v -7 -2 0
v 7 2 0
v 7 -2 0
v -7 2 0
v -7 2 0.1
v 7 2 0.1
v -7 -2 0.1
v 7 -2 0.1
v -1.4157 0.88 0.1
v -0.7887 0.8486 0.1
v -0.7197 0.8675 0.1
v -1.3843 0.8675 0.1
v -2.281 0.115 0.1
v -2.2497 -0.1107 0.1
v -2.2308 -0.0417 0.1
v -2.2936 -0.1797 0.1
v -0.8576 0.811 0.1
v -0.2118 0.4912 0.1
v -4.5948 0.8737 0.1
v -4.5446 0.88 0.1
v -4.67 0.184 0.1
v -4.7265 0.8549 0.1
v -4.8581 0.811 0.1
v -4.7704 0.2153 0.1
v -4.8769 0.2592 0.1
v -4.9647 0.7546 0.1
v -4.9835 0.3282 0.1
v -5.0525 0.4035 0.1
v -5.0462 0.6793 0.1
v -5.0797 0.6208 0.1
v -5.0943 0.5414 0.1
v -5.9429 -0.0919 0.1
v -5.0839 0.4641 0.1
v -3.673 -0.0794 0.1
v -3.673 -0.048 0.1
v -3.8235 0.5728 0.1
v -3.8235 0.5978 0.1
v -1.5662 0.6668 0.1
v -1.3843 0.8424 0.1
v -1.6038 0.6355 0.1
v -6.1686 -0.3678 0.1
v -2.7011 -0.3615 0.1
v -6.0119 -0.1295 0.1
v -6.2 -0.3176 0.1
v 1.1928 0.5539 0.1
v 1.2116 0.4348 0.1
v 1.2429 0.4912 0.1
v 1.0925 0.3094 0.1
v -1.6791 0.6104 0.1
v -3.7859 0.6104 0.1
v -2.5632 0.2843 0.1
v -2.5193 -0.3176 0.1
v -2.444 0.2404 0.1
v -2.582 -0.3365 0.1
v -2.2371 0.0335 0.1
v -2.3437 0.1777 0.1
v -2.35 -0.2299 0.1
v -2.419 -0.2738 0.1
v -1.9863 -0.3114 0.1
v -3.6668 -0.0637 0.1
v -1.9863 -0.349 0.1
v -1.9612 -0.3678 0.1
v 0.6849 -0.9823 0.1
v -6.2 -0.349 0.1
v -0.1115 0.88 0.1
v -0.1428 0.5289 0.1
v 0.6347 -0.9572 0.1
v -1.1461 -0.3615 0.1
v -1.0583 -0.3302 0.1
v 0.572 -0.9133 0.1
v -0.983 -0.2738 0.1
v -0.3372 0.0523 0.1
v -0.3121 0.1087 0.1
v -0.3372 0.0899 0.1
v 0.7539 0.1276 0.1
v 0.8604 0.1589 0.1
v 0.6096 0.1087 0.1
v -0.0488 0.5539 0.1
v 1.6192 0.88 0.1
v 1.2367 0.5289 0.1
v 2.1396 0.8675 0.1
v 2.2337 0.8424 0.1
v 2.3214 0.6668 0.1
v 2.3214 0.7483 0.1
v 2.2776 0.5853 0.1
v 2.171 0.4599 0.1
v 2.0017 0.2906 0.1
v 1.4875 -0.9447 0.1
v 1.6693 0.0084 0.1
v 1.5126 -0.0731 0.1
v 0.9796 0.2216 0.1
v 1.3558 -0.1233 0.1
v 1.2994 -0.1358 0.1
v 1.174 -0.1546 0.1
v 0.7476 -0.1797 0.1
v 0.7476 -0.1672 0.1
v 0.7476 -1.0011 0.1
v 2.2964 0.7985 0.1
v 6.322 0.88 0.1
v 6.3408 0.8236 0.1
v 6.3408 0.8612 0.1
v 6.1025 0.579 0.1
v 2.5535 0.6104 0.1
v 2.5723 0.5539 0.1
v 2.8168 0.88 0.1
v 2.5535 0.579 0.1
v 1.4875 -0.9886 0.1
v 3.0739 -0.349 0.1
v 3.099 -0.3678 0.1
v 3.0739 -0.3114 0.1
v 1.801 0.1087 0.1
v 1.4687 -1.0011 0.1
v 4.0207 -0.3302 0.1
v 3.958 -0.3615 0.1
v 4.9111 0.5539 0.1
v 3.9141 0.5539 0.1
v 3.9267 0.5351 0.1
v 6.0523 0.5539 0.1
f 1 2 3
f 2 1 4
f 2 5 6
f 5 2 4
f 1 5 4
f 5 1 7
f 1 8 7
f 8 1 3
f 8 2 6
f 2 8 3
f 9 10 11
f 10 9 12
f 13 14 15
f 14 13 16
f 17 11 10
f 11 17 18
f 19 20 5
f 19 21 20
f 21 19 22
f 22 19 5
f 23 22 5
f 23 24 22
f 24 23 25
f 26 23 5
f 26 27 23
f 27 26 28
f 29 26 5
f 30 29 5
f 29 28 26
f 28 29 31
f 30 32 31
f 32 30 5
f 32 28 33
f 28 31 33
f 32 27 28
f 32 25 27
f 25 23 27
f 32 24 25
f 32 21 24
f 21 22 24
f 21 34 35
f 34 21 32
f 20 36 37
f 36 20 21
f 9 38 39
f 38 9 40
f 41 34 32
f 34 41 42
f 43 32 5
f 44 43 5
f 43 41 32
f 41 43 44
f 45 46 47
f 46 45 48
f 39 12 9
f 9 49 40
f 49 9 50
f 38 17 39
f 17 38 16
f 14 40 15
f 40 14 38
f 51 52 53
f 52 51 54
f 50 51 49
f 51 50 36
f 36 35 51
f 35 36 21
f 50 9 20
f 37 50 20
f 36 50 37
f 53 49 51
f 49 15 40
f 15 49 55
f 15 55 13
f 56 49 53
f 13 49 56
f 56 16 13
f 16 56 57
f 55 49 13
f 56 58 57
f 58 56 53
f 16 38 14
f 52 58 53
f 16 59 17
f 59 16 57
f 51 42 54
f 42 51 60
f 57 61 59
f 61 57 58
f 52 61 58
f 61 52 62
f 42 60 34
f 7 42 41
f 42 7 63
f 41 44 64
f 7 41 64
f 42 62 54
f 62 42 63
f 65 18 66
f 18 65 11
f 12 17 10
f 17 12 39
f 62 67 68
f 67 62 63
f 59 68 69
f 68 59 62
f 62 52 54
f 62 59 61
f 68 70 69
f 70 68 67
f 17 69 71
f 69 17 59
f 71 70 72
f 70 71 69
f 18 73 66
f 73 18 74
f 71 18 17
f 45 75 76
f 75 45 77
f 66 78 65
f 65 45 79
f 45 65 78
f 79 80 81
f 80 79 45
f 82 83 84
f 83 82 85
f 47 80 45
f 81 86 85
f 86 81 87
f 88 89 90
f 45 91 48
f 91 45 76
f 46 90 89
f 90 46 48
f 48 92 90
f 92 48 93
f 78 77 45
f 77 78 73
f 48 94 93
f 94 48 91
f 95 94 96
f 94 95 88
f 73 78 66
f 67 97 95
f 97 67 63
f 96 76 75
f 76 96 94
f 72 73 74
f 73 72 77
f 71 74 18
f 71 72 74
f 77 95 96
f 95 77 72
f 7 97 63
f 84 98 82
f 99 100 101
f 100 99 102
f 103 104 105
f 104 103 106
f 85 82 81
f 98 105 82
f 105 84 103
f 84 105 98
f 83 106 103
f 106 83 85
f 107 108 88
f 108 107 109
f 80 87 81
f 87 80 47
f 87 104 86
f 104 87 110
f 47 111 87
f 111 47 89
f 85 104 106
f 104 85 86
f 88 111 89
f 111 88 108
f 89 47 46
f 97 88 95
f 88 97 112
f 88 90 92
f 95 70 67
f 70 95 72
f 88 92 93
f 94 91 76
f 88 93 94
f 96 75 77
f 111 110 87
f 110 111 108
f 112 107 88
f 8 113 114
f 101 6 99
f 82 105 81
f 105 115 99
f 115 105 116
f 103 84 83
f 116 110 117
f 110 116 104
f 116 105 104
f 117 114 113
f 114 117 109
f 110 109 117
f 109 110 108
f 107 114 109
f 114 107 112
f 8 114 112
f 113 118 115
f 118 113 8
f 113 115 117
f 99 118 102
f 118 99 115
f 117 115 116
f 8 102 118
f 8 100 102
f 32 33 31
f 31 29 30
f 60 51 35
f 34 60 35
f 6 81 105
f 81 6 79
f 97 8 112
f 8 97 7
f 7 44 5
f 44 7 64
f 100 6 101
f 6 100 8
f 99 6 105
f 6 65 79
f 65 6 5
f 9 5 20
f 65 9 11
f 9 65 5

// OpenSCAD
// file: ../p/box5-12.scad
use <../lib.scad>
function ldraw_lib__box5_12() = [
// 0 Box with 5 Faces without Any Edges
// 0 Name: box5-12.dat
// 0 Author: Chris Dee [cwdee]
// 0 !LDRAW_ORG Primitive UPDATE 2009-02
// 0 !LICENSE Licensed under CC BY 4.0 : see CAreadme.txt
// 
// 0 BFC CERTIFY CCW
  [0,"BFC","CERTIFY"],
  [0,"BFC","CCW"],
// 
// 0 !HISTORY 2009-09-03 [PTadmin] Official Update 2009-02
// 
// 
// 4 16 1 1 1 1 1 -1 -1 1 -1 -1 1 1
  [4,16,1,1,1,1,1,-1,-1,1,-1,-1,1,1],
// 4 16 -1 0 1 1 0 1 1 1 1 -1 1 1
  [4,16,-1,0,1,1,0,1,1,1,1,-1,1,1],
// 4 16 -1 0 -1 -1 0 1 -1 1 1 -1 1 -1
  [4,16,-1,0,-1,-1,0,1,-1,1,1,-1,1,-1],
// 4 16 1 0 -1 -1 0 -1 -1 1 -1 1 1 -1
  [4,16,1,0,-1,-1,0,-1,-1,1,-1,1,1,-1],
// 4 16 1 0 1 1 0 -1 1 1 -1 1 1 1
  [4,16,1,0,1,1,0,-1,1,1,-1,1,1,1],
// 0
];
module ldraw_lib__box5_12(step=0, col=false, unit=2/5, alt=false, line=0.2, solid=!$preview)
    makepoly(ldraw_lib__box5_12(), step=step, col=col, unit=unit, alt=alt, line=line, solid=solid);
ldraw_lib__box5_12(line=0.2);
// main file
use <../lib.scad>
use <../p/box5-12.scad>
function ldraw_lib__6255869r() = [
// 0 Sticker  0.5 x  1.8 with Silver Dodge "SRT" Logo
// 0 Name: 6255869r.dat
// 0 Author: Magnus Forsberg [MagFors]
// 0 !LDRAW_ORG Part UPDATE 2024-05
// 0 !LICENSE Licensed under CC BY 4.0 : see CAreadme.txt
// 
// 0 BFC CERTIFY CCW
  [0,"BFC","CERTIFY"],
  [0,"BFC","CCW"],
// 
// 0 !KEYWORDS Bricklink 75893stk01, Brickowl 472633, Dodge, Rebrickable 49146
// 0 !KEYWORDS set 75893, Speed Champions
// 
// 0 !HISTORY 2024-06-30 [OrionP] Official Update 2024-05
// 
// 
// 1 16 0 -.25 0 17.5 0 0 0 .25 0 0 0 5 box5-12.dat
  [1,16,0,-.25,0,17.5,0,0,0,.25,0,0,0,5, ldraw_lib__box5_12()],
// 
// 4 0 -3.53925 -.25 2.2 -3.46087 -.25 2.16865 -1.97165 -.25 2.12162 -1.79922 -.25 2.16865
  [4,0,-3.53925,-.25,2.2,-3.46087,-.25,2.16865,-1.97165,-.25,2.12162,-1.79922,-.25,2.16865],
// 4 80 -5.70253 -.25 .28753 -5.73388 -.25 -.44924 -5.62415 -.25 -.2768 -5.57712 -.25 -.10436
  [4,80,-5.70253,-.25,.28753,-5.73388,-.25,-.44924,-5.62415,-.25,-.2768,-5.57712,-.25,-.10436],
// 4 80 -1.97165 -.25 2.12162 -2.14409 -.25 2.02756 -.52947 -.25 1.22809 -1.79922 -.25 2.16865
  [4,80,-1.97165,-.25,2.12162,-2.14409,-.25,2.02756,-.52947,-.25,1.22809,-1.79922,-.25,2.16865],
// 3 0 -11.48696 -.25 2.18432 -11.36155 -.25 2.2 -17.5 -.25 5
  [3,0,-11.48696,-.25,2.18432,-11.36155,-.25,2.2,-17.5,-.25,5],
// 4 80 -11.67507 -.25 .45997 -11.36155 -.25 2.2 -11.48696 -.25 2.18432 -11.81615 -.25 2.1373
  [4,80,-11.67507,-.25,.45997,-11.36155,-.25,2.2,-11.48696,-.25,2.18432,-11.81615,-.25,2.1373],
// 3 0 -11.81615 -.25 2.1373 -11.48696 -.25 2.18432 -17.5 -.25 5
  [3,0,-11.81615,-.25,2.1373,-11.48696,-.25,2.18432,-17.5,-.25,5],
// 3 0 -12.14535 -.25 2.02756 -11.81615 -.25 2.1373 -17.5 -.25 5
  [3,0,-12.14535,-.25,2.02756,-11.81615,-.25,2.1373,-17.5,-.25,5],
// 4 80 -11.92588 -.25 .53835 -11.81615 -.25 2.1373 -12.14535 -.25 2.02756 -12.19237 -.25 .64808
  [4,80,-11.92588,-.25,.53835,-11.81615,-.25,2.1373,-12.14535,-.25,2.02756,-12.19237,-.25,.64808],
// 3 0 -12.41184 -.25 1.88648 -12.14535 -.25 2.02756 -17.5 -.25 5
  [3,0,-12.41184,-.25,1.88648,-12.14535,-.25,2.02756,-17.5,-.25,5],
// 4 80 -12.45887 -.25 .82052 -12.14535 -.25 2.02756 -12.41184 -.25 1.88648 -12.6313 -.25 1.00863
  [4,80,-12.45887,-.25,.82052,-12.14535,-.25,2.02756,-12.41184,-.25,1.88648,-12.6313,-.25,1.00863],
// 3 0 -12.61562 -.25 1.69837 -12.41184 -.25 1.88648 -17.5 -.25 5
  [3,0,-12.61562,-.25,1.69837,-12.41184,-.25,1.88648,-17.5,-.25,5],
// 3 0 -12.69923 -.25 1.55206 -12.61562 -.25 1.69837 -17.5 -.25 5
  [3,0,-12.69923,-.25,1.55206,-12.61562,-.25,1.69837,-17.5,-.25,5],
// 4 80 -12.6313 -.25 1.00863 -12.41184 -.25 1.88648 -12.61562 -.25 1.69837 -12.73581 -.25 1.3535
  [4,80,-12.6313,-.25,1.00863,-12.41184,-.25,1.88648,-12.61562,-.25,1.69837,-12.73581,-.25,1.3535],
// 4 0 -12.73581 -.25 1.3535 -12.69923 -.25 1.55206 -17.5 -.25 5 -14.85729 -.25 -.22977
  [4,0,-12.73581,-.25,1.3535,-12.69923,-.25,1.55206,-17.5,-.25,5,-14.85729,-.25,-.22977],
// 3 0 -14.85729 -.25 -.22977 -12.6313 -.25 1.00863 -12.70968 -.25 1.16016
  [3,0,-14.85729,-.25,-.22977,-12.6313,-.25,1.00863,-12.70968,-.25,1.16016],
// 3 80 -12.6313 -.25 1.00863 -12.73581 -.25 1.3535 -12.70968 -.25 1.16016
  [3,80,-12.6313,-.25,1.00863,-12.73581,-.25,1.3535,-12.70968,-.25,1.16016],
// 3 0 -14.85729 -.25 -.22977 -12.45887 -.25 .82052 -12.6313 -.25 1.00863
  [3,0,-14.85729,-.25,-.22977,-12.45887,-.25,.82052,-12.6313,-.25,1.00863],
// 3 0 -14.85729 -.25 -.22977 -12.19237 -.25 .64808 -12.45887 -.25 .82052
  [3,0,-14.85729,-.25,-.22977,-12.19237,-.25,.64808,-12.45887,-.25,.82052],
// 3 80 -12.19237 -.25 .64808 -12.14535 -.25 2.02756 -12.45887 -.25 .82052
  [3,80,-12.19237,-.25,.64808,-12.14535,-.25,2.02756,-12.45887,-.25,.82052],
// 3 0 -14.85729 -.25 -.22977 -11.92588 -.25 .53835 -12.19237 -.25 .64808
  [3,0,-14.85729,-.25,-.22977,-11.92588,-.25,.53835,-12.19237,-.25,.64808],
// 3 0 -14.85729 -.25 -.22977 -11.67507 -.25 .45997 -11.92588 -.25 .53835
  [3,0,-14.85729,-.25,-.22977,-11.67507,-.25,.45997,-11.92588,-.25,.53835],
// 3 80 -11.67507 -.25 .45997 -11.81615 -.25 2.1373 -11.92588 -.25 .53835
  [3,80,-11.67507,-.25,.45997,-11.81615,-.25,2.1373,-11.92588,-.25,.53835],
// 4 0 -11.67507 -.25 .45997 -14.85729 -.25 -.22977 -9.18259 -.25 -.19842 -9.18259 -.25 -.12004
  [4,0,-11.67507,-.25,.45997,-14.85729,-.25,-.22977,-9.18259,-.25,-.19842,-9.18259,-.25,-.12004],
// 4 80 -9.55881 -.25 1.43188 -9.55881 -.25 1.49458 -11.36155 -.25 2.2 -11.67507 -.25 .45997
  [4,80,-9.55881,-.25,1.43188,-9.55881,-.25,1.49458,-11.36155,-.25,2.2,-11.67507,-.25,.45997],
// 4 80 -3.91547 -.25 1.66702 -3.46087 -.25 2.10594 -3.53925 -.25 2.2 -4.00953 -.25 1.58864
  [4,80,-3.91547,-.25,1.66702,-3.46087,-.25,2.10594,-3.53925,-.25,2.2,-4.00953,-.25,1.58864],
// 4 80 -15.42162 -.25 -.91951 -6.75282 -.25 -.90384 -9.18259 -.25 -.19842 -14.85729 -.25 -.22977
  [4,80,-15.42162,-.25,-.91951,-6.75282,-.25,-.90384,-9.18259,-.25,-.19842,-14.85729,-.25,-.22977],
// 3 0 -15.02972 -.25 -.32383 -14.85729 -.25 -.22977 -17.5 -.25 5
  [3,0,-15.02972,-.25,-.32383,-14.85729,-.25,-.22977,-17.5,-.25,5],
// 3 0 -15.5 -.25 -.79411 -15.02972 -.25 -.32383 -17.5 -.25 5
  [3,0,-15.5,-.25,-.79411,-15.02972,-.25,-.32383,-17.5,-.25,5],
// 4 80 -15.02972 -.25 -.32383 -15.5 -.25 -.79411 -15.42162 -.25 -.91951 -14.85729 -.25 -.22977
  [4,80,-15.02972,-.25,-.32383,-15.5,-.25,-.79411,-15.42162,-.25,-.91951,-14.85729,-.25,-.22977],
// 4 0 2.98195 -.25 1.38485 2.73113 -.25 .77349 3.02897 -.25 1.08701 3.10735 -.25 1.22809
  [4,0,2.98195,-.25,1.38485,2.73113,-.25,.77349,3.02897,-.25,1.08701,3.10735,-.25,1.22809],
// 3 80 -3.46087 -.25 2.10594 -3.46087 -.25 2.16865 -3.53925 -.25 2.2
  [3,80,-3.46087,-.25,2.10594,-3.46087,-.25,2.16865,-3.53925,-.25,2.2],
// 4 80 -4.00953 -.25 1.58864 -3.53925 -.25 2.2 -9.46476 -.25 1.52593 -4.19764 -.25 1.52593
  [4,80,-4.00953,-.25,1.58864,-3.53925,-.25,2.2,-9.46476,-.25,1.52593,-4.19764,-.25,1.52593],
// 4 0 -2.14409 -.25 2.02756 -3.46087 -.25 2.10594 -3.91547 -.25 1.66702 -5.73388 -.25 -.44924
  [4,0,-2.14409,-.25,2.02756,-3.46087,-.25,2.10594,-3.91547,-.25,1.66702,-5.73388,-.25,-.44924],
// 4 0 -5.62415 -.25 -.2768 -3.91547 -.25 1.66702 -4.00953 -.25 1.58864 -5.57712 -.25 -.10436
  [4,0,-5.62415,-.25,-.2768,-3.91547,-.25,1.66702,-4.00953,-.25,1.58864,-5.57712,-.25,-.10436],
// 4 80 -6.40795 -.25 .71078 -6.45498 -.25 -.84113 -6.29822 -.25 -.79411 -6.1101 -.25 .60105
  [4,80,-6.40795,-.25,.71078,-6.45498,-.25,-.84113,-6.29822,-.25,-.79411,-6.1101,-.25,.60105],
// 4 0 -9.55881 -.25 1.43188 -6.40795 -.25 .71078 -4.19764 -.25 1.52593 -9.46476 -.25 1.52593
  [4,0,-9.55881,-.25,1.43188,-6.40795,-.25,.71078,-4.19764,-.25,1.52593,-9.46476,-.25,1.52593],
// 4 80 -9.18259 -.25 -.12004 -6.40795 -.25 .71078 -9.55881 -.25 1.43188 -11.67507 -.25 .45997
  [4,80,-9.18259,-.25,-.12004,-6.40795,-.25,.71078,-9.55881,-.25,1.43188,-11.67507,-.25,.45997],
// 3 80 -9.46476 -.25 1.52593 -3.53925 -.25 2.2 -11.36155 -.25 2.2
  [3,80,-9.46476,-.25,1.52593,-3.53925,-.25,2.2,-11.36155,-.25,2.2],
// 3 80 -9.55881 -.25 1.49458 -9.46476 -.25 1.52593 -11.36155 -.25 2.2
  [3,80,-9.55881,-.25,1.49458,-9.46476,-.25,1.52593,-11.36155,-.25,2.2],
// 3 0 -9.55881 -.25 1.43188 -9.46476 -.25 1.52593 -9.55881 -.25 1.49458
  [3,0,-9.55881,-.25,1.43188,-9.46476,-.25,1.52593,-9.55881,-.25,1.49458],
// 3 0 -6.1101 -.25 .60105 -4.19764 -.25 1.52593 -6.40795 -.25 .71078
  [3,0,-6.1101,-.25,.60105,-4.19764,-.25,1.52593,-6.40795,-.25,.71078],
// 4 0 -5.57712 -.25 -.10436 -4.00953 -.25 1.58864 -4.19764 -.25 1.52593 -5.5928 -.25 .08375
  [4,0,-5.57712,-.25,-.10436,-4.00953,-.25,1.58864,-4.19764,-.25,1.52593,-5.5928,-.25,.08375],
// 3 80 -5.57712 -.25 -.10436 -5.5928 -.25 .08375 -5.70253 -.25 .28753
  [3,80,-5.57712,-.25,-.10436,-5.5928,-.25,.08375,-5.70253,-.25,.28753],
// 3 0 -5.85929 -.25 .44429 -4.19764 -.25 1.52593 -6.1101 -.25 .60105
  [3,0,-5.85929,-.25,.44429,-4.19764,-.25,1.52593,-6.1101,-.25,.60105],
// 3 0 -5.70253 -.25 .28753 -4.19764 -.25 1.52593 -5.85929 -.25 .44429
  [3,0,-5.70253,-.25,.28753,-4.19764,-.25,1.52593,-5.85929,-.25,.44429],
// 4 80 -5.87497 -.25 -.57464 -5.73388 -.25 -.44924 -5.70253 -.25 .28753 -5.85929 -.25 .44429
  [4,80,-5.87497,-.25,-.57464,-5.73388,-.25,-.44924,-5.70253,-.25,.28753,-5.85929,-.25,.44429],
// 3 0 -5.5928 -.25 .08375 -4.19764 -.25 1.52593 -5.70253 -.25 .28753
  [3,0,-5.5928,-.25,.08375,-4.19764,-.25,1.52593,-5.70253,-.25,.28753],
// 4 80 -6.0474 -.25 -.68438 -5.87497 -.25 -.57464 -5.85929 -.25 .44429 -6.1101 -.25 .60105
  [4,80,-6.0474,-.25,-.68438,-5.87497,-.25,-.57464,-5.85929,-.25,.44429,-6.1101,-.25,.60105],
// 3 0 -5.73388 -.25 -.44924 -3.91547 -.25 1.66702 -5.62415 -.25 -.2768
  [3,0,-5.73388,-.25,-.44924,-3.91547,-.25,1.66702,-5.62415,-.25,-.2768],
// 3 80 -6.29822 -.25 -.79411 -6.0474 -.25 -.68438 -6.1101 -.25 .60105
  [3,80,-6.29822,-.25,-.79411,-6.0474,-.25,-.68438,-6.1101,-.25,.60105],
// 4 0 -2.14409 -.25 2.02756 -5.73388 -.25 -.44924 -5.87497 -.25 -.57464 -4.96576 -.25 -.77843
  [4,0,-2.14409,-.25,2.02756,-5.73388,-.25,-.44924,-5.87497,-.25,-.57464,-4.96576,-.25,-.77843],
// 4 80 -6.45498 -.25 -.84113 -6.40795 -.25 .71078 -9.16692 -.25 -.15923 -6.75282 -.25 -.90384
  [4,80,-6.45498,-.25,-.84113,-6.40795,-.25,.71078,-9.16692,-.25,-.15923,-6.75282,-.25,-.90384],
// 4 0 -4.96576 -.25 -.87249 -4.96576 -.25 -.77843 -5.87497 -.25 -.57464 -6.0474 -.25 -.68438
  [4,0,-4.96576,-.25,-.87249,-4.96576,-.25,-.77843,-5.87497,-.25,-.57464,-6.0474,-.25,-.68438],
// 4 0 -4.96576 -.25 -.87249 -6.0474 -.25 -.68438 -6.29822 -.25 -.79411 -4.90306 -.25 -.91951
  [4,0,-4.96576,-.25,-.87249,-6.0474,-.25,-.68438,-6.29822,-.25,-.79411,-4.90306,-.25,-.91951],
// 3 80 -6.75282 -.25 -.90384 -9.16692 -.25 -.15923 -9.18259 -.25 -.19842
  [3,80,-6.75282,-.25,-.90384,-9.16692,-.25,-.15923,-9.18259,-.25,-.19842],
// 4 0 -6.75282 -.25 -.90384 -15.42162 -.25 -.91951 -17.5 -.25 -5 1.7122 -.25 -2.45576
  [4,0,-6.75282,-.25,-.90384,-15.42162,-.25,-.91951,-17.5,-.25,-5,1.7122,-.25,-2.45576],
// 3 80 -15.42162 -.25 -.91951 -15.5 -.25 -.79411 -15.5 -.25 -.87249
  [3,80,-15.42162,-.25,-.91951,-15.5,-.25,-.79411,-15.5,-.25,-.87249],
// 3 0 -17.5 -.25 -5 -15.42162 -.25 -.91951 -15.5 -.25 -.87249
  [3,0,-17.5,-.25,-5,-15.42162,-.25,-.91951,-15.5,-.25,-.87249],
// 4 0 -6.75282 -.25 -.90384 1.7122 -.25 -2.45576 -4.90306 -.25 -.91951 -6.45498 -.25 -.84113
  [4,0,-6.75282,-.25,-.90384,1.7122,-.25,-2.45576,-4.90306,-.25,-.91951,-6.45498,-.25,-.84113],
// 4 80 -.27865 -.25 2.2 -1.79922 -.25 2.16865 -.52947 -.25 1.22809 -.35703 -.25 1.32215
  [4,80,-.27865,-.25,2.2,-1.79922,-.25,2.16865,-.52947,-.25,1.22809,-.35703,-.25,1.32215],
// 4 0 -2.14409 -.25 2.02756 -1.97165 -.25 2.12162 -3.46087 -.25 2.16865 -3.46087 -.25 2.10594
  [4,0,-2.14409,-.25,2.02756,-1.97165,-.25,2.12162,-3.46087,-.25,2.16865,-3.46087,-.25,2.10594],
// 4 0 1.58679 -.25 -2.39305 -2.86518 -.25 -.90384 -4.90306 -.25 -.91951 1.7122 -.25 -2.45576
  [4,0,1.58679,-.25,-2.39305,-2.86518,-.25,-.90384,-4.90306,-.25,-.91951,1.7122,-.25,-2.45576],
// 4 80 -2.86518 -.25 -.90384 -2.64572 -.25 -.82546 -4.96576 -.25 -.77843 -4.90306 -.25 -.91951
  [4,80,-2.86518,-.25,-.90384,-2.64572,-.25,-.82546,-4.96576,-.25,-.77843,-4.90306,-.25,-.91951],
// 3 0 -4.90306 -.25 -.91951 -6.29822 -.25 -.79411 -6.45498 -.25 -.84113
  [3,0,-4.90306,-.25,-.91951,-6.29822,-.25,-.79411,-6.45498,-.25,-.84113],
// 3 80 -4.90306 -.25 -.91951 -4.96576 -.25 -.77843 -4.96576 -.25 -.87249
  [3,80,-4.90306,-.25,-.91951,-4.96576,-.25,-.77843,-4.96576,-.25,-.87249],
// 4 0 -2.64572 -.25 -.82546 -2.86518 -.25 -.90384 1.58679 -.25 -2.39305 1.43003 -.25 -2.28332
  [4,0,-2.64572,-.25,-.82546,-2.86518,-.25,-.90384,1.58679,-.25,-2.39305,1.43003,-.25,-2.28332],
// 4 80 -2.45761 -.25 -.68438 -2.14409 -.25 2.02756 -4.96576 -.25 -.77843 -2.64572 -.25 -.82546
  [4,80,-2.45761,-.25,-.68438,-2.14409,-.25,2.02756,-4.96576,-.25,-.77843,-2.64572,-.25,-.82546],
// 4 0 -2.45761 -.25 -.68438 -2.64572 -.25 -.82546 1.43003 -.25 -2.28332 -.84299 -.25 .13077
  [4,0,-2.45761,-.25,-.68438,-2.64572,-.25,-.82546,1.43003,-.25,-2.28332,-.84299,-.25,.13077],
// 4 0 -.52947 -.25 1.22809 -.84299 -.25 .22483 -.78028 -.25 .27186 -.35703 -.25 1.32215
  [4,0,-.52947,-.25,1.22809,-.84299,-.25,.22483,-.78028,-.25,.27186,-.35703,-.25,1.32215],
// 3 80 -2.45761 -.25 -.68438 -.52947 -.25 1.22809 -2.14409 -.25 2.02756
  [3,80,-2.45761,-.25,-.68438,-.52947,-.25,1.22809,-2.14409,-.25,2.02756],
// 4 0 2.98195 -.25 1.38485 1.52408 -.25 .27186 1.88463 -.25 .31889 2.15112 -.25 .39727
  [4,0,2.98195,-.25,1.38485,1.52408,-.25,.27186,1.88463,-.25,.31889,2.15112,-.25,.39727],
// 3 80 -.35703 -.25 1.32215 -.12189 -.25 1.38485 -.27865 -.25 2.2
  [3,80,-.35703,-.25,1.32215,-.12189,-.25,1.38485,-.27865,-.25,2.2],
// 4 80 -.27865 -.25 2.2 -.12189 -.25 1.38485 2.98195 -.25 1.38485 4.04791 -.25 2.2
  [4,80,-.27865,-.25,2.2,-.12189,-.25,1.38485,2.98195,-.25,1.38485,4.04791,-.25,2.2],
// 4 80 2.98195 -.25 1.38485 3.09168 -.25 1.32215 5.34902 -.25 2.16865 4.04791 -.25 2.2
  [4,80,2.98195,-.25,1.38485,3.09168,-.25,1.32215,5.34902,-.25,2.16865,4.04791,-.25,2.2],
// 4 80 5.58416 -.25 2.10594 5.69389 -.25 1.46323 5.80362 -.25 1.66702 5.80362 -.25 1.87081
  [4,80,5.58416,-.25,2.10594,5.69389,-.25,1.46323,5.80362,-.25,1.66702,5.80362,-.25,1.87081],
// 3 0 3.10735 -.25 1.22809 3.09168 -.25 1.32215 2.98195 -.25 1.38485
  [3,0,3.10735,-.25,1.22809,3.09168,-.25,1.32215,2.98195,-.25,1.38485],
// 4 80 5.34902 -.25 2.16865 5.00414 -.25 .72646 5.4274 -.25 1.14971 5.69389 -.25 1.46323
  [4,80,5.34902,-.25,2.16865,5.00414,-.25,.72646,5.4274,-.25,1.14971,5.69389,-.25,1.46323],
// 3 0 3.71872 -.25 -2.3617 4.17332 -.25 .02104 3.78142 -.25 -.18274
  [3,0,3.71872,-.25,-2.3617,4.17332,-.25,.02104,3.78142,-.25,-.18274],
// 4 0 2.44896 -.25 .55403 2.73113 -.25 .77349 2.98195 -.25 1.38485 2.15112 -.25 .39727
  [4,0,2.44896,-.25,.55403,2.73113,-.25,.77349,2.98195,-.25,1.38485,2.15112,-.25,.39727],
// 4 80 3.78142 -.25 -.18274 4.17332 -.25 .02104 3.02897 -.25 1.08701 2.73113 -.25 .77349
  [4,80,3.78142,-.25,-.18274,4.17332,-.25,.02104,3.02897,-.25,1.08701,2.73113,-.25,.77349],
// 4 80 3.38952 -.25 -.30815 3.78142 -.25 -.18274 2.73113 -.25 .77349 3.24844 -.25 -.3395
  [4,80,3.38952,-.25,-.30815,3.78142,-.25,-.18274,2.73113,-.25,.77349,3.24844,-.25,-.3395],
// 4 0 1.52408 -.25 .27186 2.98195 -.25 1.38485 -.12189 -.25 1.38485 -.78028 -.25 .27186
  [4,0,1.52408,-.25,.27186,2.98195,-.25,1.38485,-.12189,-.25,1.38485,-.78028,-.25,.27186],
// 4 80 2.73113 -.25 .77349 2.44896 -.25 .55403 2.93492 -.25 -.38653 3.24844 -.25 -.3395
  [4,80,2.73113,-.25,.77349,2.44896,-.25,.55403,2.93492,-.25,-.38653,3.24844,-.25,-.3395],
// 4 0 1.86895 -.25 -.44924 3.71872 -.25 -2.3617 2.93492 -.25 -.38653 1.86895 -.25 -.41788
  [4,0,1.86895,-.25,-.44924,3.71872,-.25,-2.3617,2.93492,-.25,-.38653,1.86895,-.25,-.41788],
// 3 0 -.78028 -.25 .27186 -.12189 -.25 1.38485 -.35703 -.25 1.32215
  [3,0,-.78028,-.25,.27186,-.12189,-.25,1.38485,-.35703,-.25,1.32215],
// 4 80 1.86895 -.25 -.44924 1.58679 -.25 -2.39305 1.7122 -.25 -2.45576 1.86895 -.25 -2.50279
  [4,80,1.86895,-.25,-.44924,1.58679,-.25,-2.39305,1.7122,-.25,-2.45576,1.86895,-.25,-2.50279],
// 4 80 2.15112 -.25 .39727 1.88463 -.25 .31889 1.86895 -.25 -.41788 2.93492 -.25 -.38653
  [4,80,2.15112,-.25,.39727,1.88463,-.25,.31889,1.86895,-.25,-.41788,2.93492,-.25,-.38653],
// 4 80 -.84299 -.25 .13077 1.52408 -.25 .27186 -.78028 -.25 .27186 -.84299 -.25 .22483
  [4,80,-.84299,-.25,.13077,1.52408,-.25,.27186,-.78028,-.25,.27186,-.84299,-.25,.22483],
// 3 0 -2.45761 -.25 -.68438 -.84299 -.25 .22483 -.52947 -.25 1.22809
  [3,0,-2.45761,-.25,-.68438,-.84299,-.25,.22483,-.52947,-.25,1.22809],
// 3 0 -2.45761 -.25 -.68438 -.84299 -.25 .13077 -.84299 -.25 .22483
  [3,0,-2.45761,-.25,-.68438,-.84299,-.25,.13077,-.84299,-.25,.22483],
// 4 80 1.86895 -.25 -.41788 1.52408 -.25 .27186 -.84299 -.25 .13077 1.86895 -.25 -.44924
  [4,80,1.86895,-.25,-.41788,1.52408,-.25,.27186,-.84299,-.25,.13077,1.86895,-.25,-.44924],
// 3 0 -17.5 -.25 -5 1.86895 -.25 -2.50279 1.7122 -.25 -2.45576
  [3,0,-17.5,-.25,-5,1.86895,-.25,-2.50279,1.7122,-.25,-2.45576],
// 3 80 5.80362 -.25 1.87081 5.74091 -.25 1.99621 5.58416 -.25 2.10594
  [3,80,5.80362,-.25,1.87081,5.74091,-.25,1.99621,5.58416,-.25,2.10594],
// 4 80 15.80488 -.25 2.2 15.25622 -.25 1.44755 15.8519 -.25 2.05892 15.8519 -.25 2.15297
  [4,80,15.80488,-.25,2.2,15.25622,-.25,1.44755,15.8519,-.25,2.05892,15.8519,-.25,2.15297],
// 4 80 7.042 -.25 2.2 6.38363 -.25 1.52593 6.38363 -.25 1.44755 6.43066 -.25 1.38485
  [4,80,7.042,-.25,2.2,6.38363,-.25,1.52593,6.38363,-.25,1.44755,6.43066,-.25,1.38485],
// 3 80 5.69389 -.25 1.46323 5.58416 -.25 2.10594 5.34902 -.25 2.16865
  [3,80,5.69389,-.25,1.46323,5.58416,-.25,2.10594,5.34902,-.25,2.16865],
// 3 0 5.74091 -.25 1.99621 7.042 -.25 2.2 5.58416 -.25 2.10594
  [3,0,5.74091,-.25,1.99621,7.042,-.25,2.2,5.58416,-.25,2.10594],
// 4 0 7.042 -.25 2.2 5.74091 -.25 1.99621 5.80362 -.25 1.87081 6.38363 -.25 1.52593
  [4,0,7.042,-.25,2.2,5.74091,-.25,1.99621,5.80362,-.25,1.87081,6.38363,-.25,1.52593],
// 4 0 6.38363 -.25 1.44755 6.38363 -.25 1.52593 5.80362 -.25 1.66702 5.69389 -.25 1.46323
  [4,0,6.38363,-.25,1.44755,6.38363,-.25,1.52593,5.80362,-.25,1.66702,5.69389,-.25,1.46323],
// 4 0 3.71872 -.25 -2.47143 7.74744 -.25 -.91951 7.68473 -.25 -.87249 3.71872 -.25 -2.3617
  [4,0,3.71872,-.25,-2.47143,7.74744,-.25,-.91951,7.68473,-.25,-.87249,3.71872,-.25,-2.3617],
// 4 80 5.00414 -.25 .72646 5.34902 -.25 2.16865 3.09168 -.25 1.32215 3.10735 -.25 1.22809
  [4,80,5.00414,-.25,.72646,5.34902,-.25,2.16865,3.09168,-.25,1.32215,3.10735,-.25,1.22809],
// 4 0 6.43066 -.25 1.38485 5.4274 -.25 1.14971 5.00414 -.25 .72646 7.68473 -.25 -.77843
  [4,0,6.43066,-.25,1.38485,5.4274,-.25,1.14971,5.00414,-.25,.72646,7.68473,-.25,-.77843],
// 4 80 4.50251 -.25 .27186 5.00414 -.25 .72646 3.10735 -.25 1.22809 4.17332 -.25 .02104
  [4,80,4.50251,-.25,.27186,5.00414,-.25,.72646,3.10735,-.25,1.22809,4.17332,-.25,.02104],
// 4 0 6.43066 -.25 1.38485 6.38363 -.25 1.44755 5.69389 -.25 1.46323 5.4274 -.25 1.14971
  [4,0,6.43066,-.25,1.38485,6.38363,-.25,1.44755,5.69389,-.25,1.46323,5.4274,-.25,1.14971],
// 4 0 4.50251 -.25 .27186 4.17332 -.25 .02104 3.71872 -.25 -2.3617 7.68473 -.25 -.87249
  [4,0,4.50251,-.25,.27186,4.17332,-.25,.02104,3.71872,-.25,-2.3617,7.68473,-.25,-.87249],
// 3 80 4.17332 -.25 .02104 3.10735 -.25 1.22809 3.02897 -.25 1.08701
  [3,80,4.17332,-.25,.02104,3.10735,-.25,1.22809,3.02897,-.25,1.08701],
// 4 80 1.86895 -.25 -.44924 1.86895 -.25 -2.50279 3.67169 -.25 -2.50279 3.71872 -.25 -2.3617
  [4,80,1.86895,-.25,-.44924,1.86895,-.25,-2.50279,3.67169,-.25,-2.50279,3.71872,-.25,-2.3617],
// 3 0 3.71872 -.25 -2.3617 3.78142 -.25 -.18274 3.38952 -.25 -.30815
  [3,0,3.71872,-.25,-2.3617,3.78142,-.25,-.18274,3.38952,-.25,-.30815],
// 4 80 1.43003 -.25 -2.28332 1.58679 -.25 -2.39305 1.86895 -.25 -.44924 -.84299 -.25 .13077
  [4,80,1.43003,-.25,-2.28332,1.58679,-.25,-2.39305,1.86895,-.25,-.44924,-.84299,-.25,.13077],
// 3 0 3.71872 -.25 -2.3617 3.38952 -.25 -.30815 3.24844 -.25 -.3395
  [3,0,3.71872,-.25,-2.3617,3.38952,-.25,-.30815,3.24844,-.25,-.3395],
// 3 80 2.93492 -.25 -.38653 2.44896 -.25 .55403 2.15112 -.25 .39727
  [3,80,2.93492,-.25,-.38653,2.44896,-.25,.55403,2.15112,-.25,.39727],
// 3 0 3.71872 -.25 -2.3617 3.24844 -.25 -.3395 2.93492 -.25 -.38653
  [3,0,3.71872,-.25,-2.3617,3.24844,-.25,-.3395,2.93492,-.25,-.38653],
// 3 80 1.86895 -.25 -.41788 1.88463 -.25 .31889 1.52408 -.25 .27186
  [3,80,1.86895,-.25,-.41788,1.88463,-.25,.31889,1.52408,-.25,.27186],
// 4 0 7.68473 -.25 -.77843 5.00414 -.25 .72646 4.50251 -.25 .27186 7.68473 -.25 -.87249
  [4,0,7.68473,-.25,-.77843,5.00414,-.25,.72646,4.50251,-.25,.27186,7.68473,-.25,-.87249],
// 3 80 3.67169 -.25 -2.50279 3.71872 -.25 -2.47143 3.71872 -.25 -2.3617
  [3,80,3.67169,-.25,-2.50279,3.71872,-.25,-2.47143,3.71872,-.25,-2.3617],
// 3 0 17.5 -.25 -5 10.0518 -.25 -.82546 9.89504 -.25 -.90384
  [3,0,17.5,-.25,-5,10.0518,-.25,-.82546,9.89504,-.25,-.90384],
// 3 0 15.8519 -.25 2.15297 17.5 -.25 5 15.80488 -.25 2.2
  [3,0,15.8519,-.25,2.15297,17.5,-.25,5,15.80488,-.25,2.2],
// 3 0 5.58416 -.25 2.10594 7.042 -.25 2.2 5.34902 -.25 2.16865
  [3,0,5.58416,-.25,2.10594,7.042,-.25,2.2,5.34902,-.25,2.16865],
// 4 80 12.27779 -.25 1.38485 15.80488 -.25 2.2 7.042 -.25 2.2 9.78531 -.25 1.38485
  [4,80,12.27779,-.25,1.38485,15.80488,-.25,2.2,7.042,-.25,2.2,9.78531,-.25,1.38485],
// 3 0 6.38363 -.25 1.52593 5.80362 -.25 1.87081 5.80362 -.25 1.66702
  [3,0,6.38363,-.25,1.52593,5.80362,-.25,1.87081,5.80362,-.25,1.66702],
// 4 0 7.68473 -.25 -.77843 9.81666 -.25 1.33782 9.78531 -.25 1.38485 6.43066 -.25 1.38485
  [4,0,7.68473,-.25,-.77843,9.81666,-.25,1.33782,9.78531,-.25,1.38485,6.43066,-.25,1.38485],
// 3 80 9.78531 -.25 1.38485 7.042 -.25 2.2 6.43066 -.25 1.38485
  [3,80,9.78531,-.25,1.38485,7.042,-.25,2.2,6.43066,-.25,1.38485],
// 4 80 9.89504 -.25 -.90384 10.0518 -.25 -.82546 9.81666 -.25 1.33782 7.74744 -.25 -.91951
  [4,80,9.89504,-.25,-.90384,10.0518,-.25,-.82546,9.81666,-.25,1.33782,7.74744,-.25,-.91951],
// 4 80 9.81666 -.25 1.33782 7.68473 -.25 -.77843 7.68473 -.25 -.87249 7.74744 -.25 -.91951
  [4,80,9.81666,-.25,1.33782,7.68473,-.25,-.77843,7.68473,-.25,-.87249,7.74744,-.25,-.91951],
// 4 0 9.89504 -.25 -.90384 7.74744 -.25 -.91951 3.71872 -.25 -2.47143 3.67169 -.25 -2.50279
  [4,0,9.89504,-.25,-.90384,7.74744,-.25,-.91951,3.71872,-.25,-2.47143,3.67169,-.25,-2.50279],
// 3 0 17.5 -.25 -5 9.89504 -.25 -.90384 3.67169 -.25 -2.50279
  [3,0,17.5,-.25,-5,9.89504,-.25,-.90384,3.67169,-.25,-2.50279],
// 4 0 12.27779 -.25 1.38485 10.0518 -.25 -.82546 17.5 -.25 -5 15.13081 -.25 1.38485
  [4,0,12.27779,-.25,1.38485,10.0518,-.25,-.82546,17.5,-.25,-5,15.13081,-.25,1.38485],
// 3 80 10.0518 -.25 -.82546 12.27779 -.25 1.38485 9.81666 -.25 1.33782
  [3,80,10.0518,-.25,-.82546,12.27779,-.25,1.38485,9.81666,-.25,1.33782],
// 4 80 15.80488 -.25 2.2 12.27779 -.25 1.38485 15.13081 -.25 1.38485 15.25622 -.25 1.44755
  [4,80,15.80488,-.25,2.2,12.27779,-.25,1.38485,15.13081,-.25,1.38485,15.25622,-.25,1.44755],
// 3 80 9.81666 -.25 1.33782 12.27779 -.25 1.38485 9.78531 -.25 1.38485
  [3,80,9.81666,-.25,1.33782,12.27779,-.25,1.38485,9.78531,-.25,1.38485],
// 3 0 17.5 -.25 -5 15.25622 -.25 1.44755 15.13081 -.25 1.38485
  [3,0,17.5,-.25,-5,15.25622,-.25,1.44755,15.13081,-.25,1.38485],
// 3 0 17.5 -.25 -5 15.8519 -.25 2.05892 15.25622 -.25 1.44755
  [3,0,17.5,-.25,-5,15.8519,-.25,2.05892,15.25622,-.25,1.44755],
// 3 0 -14.85729 -.25 -.22977 -12.70968 -.25 1.16016 -12.73581 -.25 1.3535
  [3,0,-14.85729,-.25,-.22977,-12.70968,-.25,1.16016,-12.73581,-.25,1.3535],
// 3 80 -12.73581 -.25 1.3535 -12.61562 -.25 1.69837 -12.69923 -.25 1.55206
  [3,80,-12.73581,-.25,1.3535,-12.61562,-.25,1.69837,-12.69923,-.25,1.55206],
// 3 80 -9.16692 -.25 -.15923 -6.40795 -.25 .71078 -9.18259 -.25 -.12004
  [3,80,-9.16692,-.25,-.15923,-6.40795,-.25,.71078,-9.18259,-.25,-.12004],
// 3 0 -9.18259 -.25 -.19842 -9.16692 -.25 -.15923 -9.18259 -.25 -.12004
  [3,0,-9.18259,-.25,-.19842,-9.16692,-.25,-.15923,-9.18259,-.25,-.12004],
// 4 0 4.04791 -.25 2.2 5.34902 -.25 2.16865 7.042 -.25 2.2 17.5 -.25 5
  [4,0,4.04791,-.25,2.2,5.34902,-.25,2.16865,7.042,-.25,2.2,17.5,-.25,5],
// 4 0 17.5 -.25 -5 3.67169 -.25 -2.50279 1.86895 -.25 -2.50279 -17.5 -.25 -5
  [4,0,17.5,-.25,-5,3.67169,-.25,-2.50279,1.86895,-.25,-2.50279,-17.5,-.25,-5],
// 4 0 -15.5 -.25 -.87249 -15.5 -.25 -.79411 -17.5 -.25 5 -17.5 -.25 -5
  [4,0,-15.5,-.25,-.87249,-15.5,-.25,-.79411,-17.5,-.25,5,-17.5,-.25,-5],
// 4 0 15.8519 -.25 2.05892 17.5 -.25 -5 17.5 -.25 5 15.8519 -.25 2.15297
  [4,0,15.8519,-.25,2.05892,17.5,-.25,-5,17.5,-.25,5,15.8519,-.25,2.15297],
// 3 0 15.80488 -.25 2.2 17.5 -.25 5 7.042 -.25 2.2
  [3,0,15.80488,-.25,2.2,17.5,-.25,5,7.042,-.25,2.2],
// 4 0 -.27865 -.25 2.2 4.04791 -.25 2.2 17.5 -.25 5 -17.5 -.25 5
  [4,0,-.27865,-.25,2.2,4.04791,-.25,2.2,17.5,-.25,5,-17.5,-.25,5],
// 3 0 -3.53925 -.25 2.2 -17.5 -.25 5 -11.36155 -.25 2.2
  [3,0,-3.53925,-.25,2.2,-17.5,-.25,5,-11.36155,-.25,2.2],
// 4 0 -1.79922 -.25 2.16865 -.27865 -.25 2.2 -17.5 -.25 5 -3.53925 -.25 2.2
  [4,0,-1.79922,-.25,2.16865,-.27865,-.25,2.2,-17.5,-.25,5,-3.53925,-.25,2.2],
];
module ldraw_lib__6255869r(step=0, col=false, unit=2/5, alt=false, line=0.2, solid=!$preview)
    makepoly(ldraw_lib__6255869r(), step=step, col=col, unit=unit, alt=alt, line=line, solid=solid);
ldraw_lib__6255869r(line=0.2);
